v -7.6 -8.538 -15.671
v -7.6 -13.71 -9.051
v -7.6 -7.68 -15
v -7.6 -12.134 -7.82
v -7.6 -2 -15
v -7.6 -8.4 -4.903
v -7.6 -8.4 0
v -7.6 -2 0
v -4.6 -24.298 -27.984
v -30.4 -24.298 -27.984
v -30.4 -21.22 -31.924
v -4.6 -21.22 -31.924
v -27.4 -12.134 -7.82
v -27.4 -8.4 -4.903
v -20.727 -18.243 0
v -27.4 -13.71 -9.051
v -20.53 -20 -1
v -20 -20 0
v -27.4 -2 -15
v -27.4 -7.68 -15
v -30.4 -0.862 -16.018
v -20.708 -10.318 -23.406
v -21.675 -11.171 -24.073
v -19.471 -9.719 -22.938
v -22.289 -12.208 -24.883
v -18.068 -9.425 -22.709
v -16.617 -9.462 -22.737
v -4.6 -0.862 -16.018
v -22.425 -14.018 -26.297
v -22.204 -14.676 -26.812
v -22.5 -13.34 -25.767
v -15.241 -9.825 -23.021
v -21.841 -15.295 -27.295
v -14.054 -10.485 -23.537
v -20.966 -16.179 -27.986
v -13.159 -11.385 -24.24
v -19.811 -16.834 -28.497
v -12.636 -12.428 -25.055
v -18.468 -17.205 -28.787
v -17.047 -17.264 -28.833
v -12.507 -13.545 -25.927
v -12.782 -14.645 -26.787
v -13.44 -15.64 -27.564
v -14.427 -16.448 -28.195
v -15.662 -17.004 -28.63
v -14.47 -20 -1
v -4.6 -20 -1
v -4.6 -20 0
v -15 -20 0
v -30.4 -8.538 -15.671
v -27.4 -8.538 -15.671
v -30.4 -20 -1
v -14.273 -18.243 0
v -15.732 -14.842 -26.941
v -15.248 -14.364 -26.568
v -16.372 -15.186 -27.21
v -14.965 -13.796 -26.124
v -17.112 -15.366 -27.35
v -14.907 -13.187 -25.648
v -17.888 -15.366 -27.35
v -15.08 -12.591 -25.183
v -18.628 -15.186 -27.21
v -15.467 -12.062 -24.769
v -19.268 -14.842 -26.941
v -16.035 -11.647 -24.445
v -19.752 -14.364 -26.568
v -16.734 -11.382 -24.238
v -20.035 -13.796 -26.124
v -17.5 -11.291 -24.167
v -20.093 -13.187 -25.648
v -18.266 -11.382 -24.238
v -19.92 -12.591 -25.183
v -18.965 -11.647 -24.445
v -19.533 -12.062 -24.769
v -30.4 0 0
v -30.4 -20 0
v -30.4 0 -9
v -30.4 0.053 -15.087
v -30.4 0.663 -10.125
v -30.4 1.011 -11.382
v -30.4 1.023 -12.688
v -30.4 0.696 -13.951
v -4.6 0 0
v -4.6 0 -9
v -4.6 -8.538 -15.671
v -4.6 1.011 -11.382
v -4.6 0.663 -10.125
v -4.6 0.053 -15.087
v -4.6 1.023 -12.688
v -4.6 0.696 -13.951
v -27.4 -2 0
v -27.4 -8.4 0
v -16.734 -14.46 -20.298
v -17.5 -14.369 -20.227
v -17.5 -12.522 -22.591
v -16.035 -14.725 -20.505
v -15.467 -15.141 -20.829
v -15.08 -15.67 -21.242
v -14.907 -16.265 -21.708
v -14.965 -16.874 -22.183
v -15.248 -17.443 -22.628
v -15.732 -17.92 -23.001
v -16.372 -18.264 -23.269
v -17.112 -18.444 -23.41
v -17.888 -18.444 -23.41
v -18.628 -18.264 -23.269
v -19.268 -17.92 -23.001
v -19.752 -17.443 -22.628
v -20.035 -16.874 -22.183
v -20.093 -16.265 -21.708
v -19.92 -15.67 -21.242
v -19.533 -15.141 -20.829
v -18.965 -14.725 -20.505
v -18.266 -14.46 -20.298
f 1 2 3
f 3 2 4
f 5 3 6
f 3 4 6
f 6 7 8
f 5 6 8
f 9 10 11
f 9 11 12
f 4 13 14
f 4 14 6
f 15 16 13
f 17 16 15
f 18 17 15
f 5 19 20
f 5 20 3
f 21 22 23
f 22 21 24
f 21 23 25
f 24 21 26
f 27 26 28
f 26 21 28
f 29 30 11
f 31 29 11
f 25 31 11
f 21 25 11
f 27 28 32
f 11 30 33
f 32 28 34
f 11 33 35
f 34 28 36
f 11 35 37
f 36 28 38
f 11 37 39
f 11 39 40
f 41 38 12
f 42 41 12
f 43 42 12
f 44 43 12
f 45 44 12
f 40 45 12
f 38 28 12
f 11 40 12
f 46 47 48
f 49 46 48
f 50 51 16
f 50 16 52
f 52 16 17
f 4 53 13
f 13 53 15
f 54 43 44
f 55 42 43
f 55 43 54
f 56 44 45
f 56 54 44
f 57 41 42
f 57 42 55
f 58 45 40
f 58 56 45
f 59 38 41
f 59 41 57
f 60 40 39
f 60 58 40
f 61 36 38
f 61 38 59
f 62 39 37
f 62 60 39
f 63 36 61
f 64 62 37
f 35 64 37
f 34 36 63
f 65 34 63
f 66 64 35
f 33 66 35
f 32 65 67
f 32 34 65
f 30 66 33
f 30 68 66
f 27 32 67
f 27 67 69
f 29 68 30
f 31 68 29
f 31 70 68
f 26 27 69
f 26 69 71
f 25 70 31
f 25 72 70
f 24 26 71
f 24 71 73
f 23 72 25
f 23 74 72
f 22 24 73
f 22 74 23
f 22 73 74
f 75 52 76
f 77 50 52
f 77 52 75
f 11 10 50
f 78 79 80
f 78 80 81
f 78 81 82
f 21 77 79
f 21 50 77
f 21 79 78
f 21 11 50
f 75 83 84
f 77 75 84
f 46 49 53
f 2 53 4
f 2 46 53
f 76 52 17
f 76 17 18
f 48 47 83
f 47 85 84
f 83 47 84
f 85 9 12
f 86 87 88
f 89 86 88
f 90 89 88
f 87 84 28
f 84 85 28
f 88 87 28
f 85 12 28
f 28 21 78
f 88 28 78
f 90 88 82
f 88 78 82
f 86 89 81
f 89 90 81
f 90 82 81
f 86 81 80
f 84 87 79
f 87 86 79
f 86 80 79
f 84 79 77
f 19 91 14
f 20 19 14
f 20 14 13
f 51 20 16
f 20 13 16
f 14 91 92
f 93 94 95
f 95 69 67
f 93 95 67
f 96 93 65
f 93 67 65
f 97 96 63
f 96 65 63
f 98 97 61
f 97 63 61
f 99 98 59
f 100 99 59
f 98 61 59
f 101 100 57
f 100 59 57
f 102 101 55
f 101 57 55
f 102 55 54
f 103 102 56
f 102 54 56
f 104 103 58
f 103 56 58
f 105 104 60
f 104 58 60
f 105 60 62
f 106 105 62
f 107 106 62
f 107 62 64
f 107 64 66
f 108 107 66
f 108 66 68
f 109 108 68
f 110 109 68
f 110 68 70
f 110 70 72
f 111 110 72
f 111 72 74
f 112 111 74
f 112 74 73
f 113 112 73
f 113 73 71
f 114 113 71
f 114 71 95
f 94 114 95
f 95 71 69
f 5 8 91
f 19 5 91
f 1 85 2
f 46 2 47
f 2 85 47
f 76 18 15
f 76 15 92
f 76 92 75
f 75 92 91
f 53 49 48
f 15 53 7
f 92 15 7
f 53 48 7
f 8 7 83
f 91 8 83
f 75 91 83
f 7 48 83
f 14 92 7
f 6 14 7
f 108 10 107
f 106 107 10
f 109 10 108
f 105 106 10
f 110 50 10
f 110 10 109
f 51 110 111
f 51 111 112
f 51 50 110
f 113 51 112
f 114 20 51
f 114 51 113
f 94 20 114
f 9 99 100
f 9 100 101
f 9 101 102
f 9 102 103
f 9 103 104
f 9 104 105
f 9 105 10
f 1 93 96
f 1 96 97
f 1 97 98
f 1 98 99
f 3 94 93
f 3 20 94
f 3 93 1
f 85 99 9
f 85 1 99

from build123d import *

# Parameters (mm, degrees)
EXTRUDE_1_DEPTH         = 35
CUT_EXTRUDE_1_DEPTH     = 8
CUT_EXTRUDE_2_DEPTH     = 9
EXTRUDE_2_DEPTH         = 6
CUT_EXTRUDE_3_DEPTH     = 3
SKETCH_9_R              = 2.6
CUT_EXTRUDE_4_DEPTH     = 3
CUT_EXTRUDE_5_DEPTH     = 90
SKETCH_11_R             = 5
SKETCH_11_R_2           = 2.6
EXTRUDE_3_DEPTH         = 2
FILLET_1_R              = 5
CUT_EXTRUDE_6_DEPTH     = 2
CUT_EXTRUDE_START       = -31.92392812
CUT_EXTRUDE_7_OUTLINE_W = 4.6
CUT_EXTRUDE_7_OUTLINE_H = 29
CUT_EXTRUDE_7_DEPTH     = 31.92392812
SKETCH_18_W             = 19.8
SKETCH_18_H             = 6.4
CUT_EXTRUDE_8_DEPTH     = 15
SKETCH_19_W             = 19.8
SKETCH_19_H             = 2
CUT_EXTRUDE_9_DEPTH     = 3


# Read off the part's stored shape, not the designer's step: 切除-拉伸7
with BuildPart() as part:
    # 草图1 → 凸台-拉伸1 (new body)
    with BuildSketch(Plane(origin=(0, 0, 0), x_dir=(0, 0, -1), z_dir=(1, 0, 0))):
        Polygon((0, 0), (9, 0), (15.670644845, -8.538036051), (1, -20), (0, -20), align=None)
    extrude(amount=-EXTRUDE_1_DEPTH)

    # 草图5 → 切除-拉伸1 (cut)
    with BuildSketch(Plane.XY):
        Polygon((-27.4, -8.4), (-7.6, -8.4), (-7.6, -2), (-17.5, -2), (-27.4, -2), align=None)
    extrude(amount=-CUT_EXTRUDE_1_DEPTH, mode=Mode.SUBTRACT)

    # 草图6 → 切除-拉伸2 (cut)
    with BuildSketch(Plane(origin=(0, -12.904366819, -10.081996315), x_dir=(1, 0, 0), z_dir=(0, -0.788010753606721, -0.6156614753256595))):
        Polygon((-7.6, 1.307903218), (-7.6, -5.092096782), (-17.5, -5.092096782), (-27.4, -5.092096782), (-27.4, 1.307903218), align=None)
    extrude(amount=-CUT_EXTRUDE_2_DEPTH, mode=Mode.SUBTRACT)

    # 草图7 → 凸台-拉伸2 (add)
    with BuildSketch(Plane(origin=(0, 4.366330768, -5.58864853), x_dir=(-1, 0, 0), z_dir=(0, 0.6156614753256597, -0.7880107536067209))):
        Polygon((0, -5.540953278), (35, -5.540953278), (35, -16.375876547), (35, -36.375876547), (0, -36.375876547), (0, -16.375876547), align=None)
    extrude(amount=EXTRUDE_2_DEPTH)

    # 草图8 → 切除-拉伸3 (cut)
    with BuildSketch(Plane(origin=(0, 8.06029962, -10.316713052), x_dir=(-1, 0, 0), z_dir=(0, 0.6156614753256597, -0.7880107536067209))):
        with BuildLine():
            ThreePointArc((13.158784289, -23.895181856), (15.019305308, -30.717092258), (21.841215711, -28.856571239))
            Line((21.841215711, -28.856571239), (13.158784289, -23.895181856))
        make_face()
        with BuildLine():
            Line((13.158784289, -23.895181856), (21.841215711, -28.856571239))
            ThreePointArc((21.841215711, -28.856571239), (22.332498244, -27.659216223), (22.5, -26.375876547))
            ThreePointArc((22.5, -26.375876547), (18.783339676, -21.543378304), (13.158784289, -23.895181856))
        make_face()
    extrude(amount=-CUT_EXTRUDE_3_DEPTH, mode=Mode.SUBTRACT)

    # 草图9 → 切除-拉伸4 (cut)
    with BuildSketch(Plane(origin=(0, 6.213315194, -7.952680791), x_dir=(-1, 0, 0), z_dir=(0, 0.6156614753256597, -0.7880107536067209))):
        with Locations(Location((17.5, -26.375876547, 0), (0, 0, 90))):
            Circle(SKETCH_9_R)
    extrude(amount=-CUT_EXTRUDE_4_DEPTH, mode=Mode.SUBTRACT)

    # 草图10 → 切除-拉伸5 (cut)
    with BuildSketch(Plane(origin=(0, 0, 0), x_dir=(0, 0, -1), z_dir=(1, 0, 0))):
        Polygon((12.940053768, 3.078307377), (31.92392812, -21.219943746), (32.711938873, -20.604282271), (13.728064522, 3.693968852), align=None)
    extrude(amount=-CUT_EXTRUDE_5_DEPTH, mode=Mode.SUBTRACT)

    # 草图11 → 凸台-拉伸3 (add)
    with BuildSketch(Plane(origin=(0, 7.444638145, -9.528702298), x_dir=(-1, 0, 0), z_dir=(0, 0.6156614753256598, -0.7880107536067208))):
        with Locations((17.5, -26.375876547)):
            Circle(SKETCH_11_R)
        with Locations(Location((17.5, -26.375876547, 0), (0, 0, 90))):
            Circle(SKETCH_11_R_2, mode=Mode.SUBTRACT)
    extrude(amount=-EXTRUDE_3_DEPTH)

    # 圆角1
    fillet_1_edges = [part.edges().sort_by_distance(p)[0] for p in [
        (-17.5, 3.078307377, -12.940053768),
    ]]
    fillet(fillet_1_edges, radius=FILLET_1_R - 0.0001)  # a hair under: the kernel refuses the full size

    # 草图16 → 切除-拉伸6 (cut)
    with BuildSketch(Plane(origin=(0, -12.904366819, -10.081996315), x_dir=(1, 0, 0), z_dir=(0, -0.788010753606721, -0.6156614753256595))):
        Polygon((-27.4, 1.307903218), (-20, 12.313229507), (-15, 12.313229507), (-7.6, 1.307903218), align=None)
    extrude(amount=-CUT_EXTRUDE_6_DEPTH, mode=Mode.SUBTRACT)

    # 切除-拉伸7 outline → 切除-拉伸7 (cut)
    with BuildSketch(Plane.XY.offset(CUT_EXTRUDE_START)):
        with Locations((-32.7, -11.5)):
            Rectangle(CUT_EXTRUDE_7_OUTLINE_W, CUT_EXTRUDE_7_OUTLINE_H)
        with Locations((-2.3, -11.5)):
            Rectangle(CUT_EXTRUDE_7_OUTLINE_W, CUT_EXTRUDE_7_OUTLINE_H)
    extrude(amount=CUT_EXTRUDE_7_DEPTH, mode=Mode.SUBTRACT)

    # 草图18 → 切除-拉伸8 (cut)
    with BuildSketch(Plane.XY):
        with Locations((-17.5, -5.2)):
            Rectangle(SKETCH_18_W, SKETCH_18_H)
    extrude(amount=-CUT_EXTRUDE_8_DEPTH, mode=Mode.SUBTRACT)

    # 草图19 → 切除-拉伸9 (cut)
    with BuildSketch(Plane(origin=(0, -12.904366819, -10.081996315), x_dir=(1, 0, 0), z_dir=(0, -0.788010753606721, -0.6156614753256595))):
        with Locations((-17.5, -6.092096782)):
            Rectangle(SKETCH_19_W, SKETCH_19_H)
    extrude(amount=-CUT_EXTRUDE_9_DEPTH, mode=Mode.SUBTRACT)


solid = part.part
